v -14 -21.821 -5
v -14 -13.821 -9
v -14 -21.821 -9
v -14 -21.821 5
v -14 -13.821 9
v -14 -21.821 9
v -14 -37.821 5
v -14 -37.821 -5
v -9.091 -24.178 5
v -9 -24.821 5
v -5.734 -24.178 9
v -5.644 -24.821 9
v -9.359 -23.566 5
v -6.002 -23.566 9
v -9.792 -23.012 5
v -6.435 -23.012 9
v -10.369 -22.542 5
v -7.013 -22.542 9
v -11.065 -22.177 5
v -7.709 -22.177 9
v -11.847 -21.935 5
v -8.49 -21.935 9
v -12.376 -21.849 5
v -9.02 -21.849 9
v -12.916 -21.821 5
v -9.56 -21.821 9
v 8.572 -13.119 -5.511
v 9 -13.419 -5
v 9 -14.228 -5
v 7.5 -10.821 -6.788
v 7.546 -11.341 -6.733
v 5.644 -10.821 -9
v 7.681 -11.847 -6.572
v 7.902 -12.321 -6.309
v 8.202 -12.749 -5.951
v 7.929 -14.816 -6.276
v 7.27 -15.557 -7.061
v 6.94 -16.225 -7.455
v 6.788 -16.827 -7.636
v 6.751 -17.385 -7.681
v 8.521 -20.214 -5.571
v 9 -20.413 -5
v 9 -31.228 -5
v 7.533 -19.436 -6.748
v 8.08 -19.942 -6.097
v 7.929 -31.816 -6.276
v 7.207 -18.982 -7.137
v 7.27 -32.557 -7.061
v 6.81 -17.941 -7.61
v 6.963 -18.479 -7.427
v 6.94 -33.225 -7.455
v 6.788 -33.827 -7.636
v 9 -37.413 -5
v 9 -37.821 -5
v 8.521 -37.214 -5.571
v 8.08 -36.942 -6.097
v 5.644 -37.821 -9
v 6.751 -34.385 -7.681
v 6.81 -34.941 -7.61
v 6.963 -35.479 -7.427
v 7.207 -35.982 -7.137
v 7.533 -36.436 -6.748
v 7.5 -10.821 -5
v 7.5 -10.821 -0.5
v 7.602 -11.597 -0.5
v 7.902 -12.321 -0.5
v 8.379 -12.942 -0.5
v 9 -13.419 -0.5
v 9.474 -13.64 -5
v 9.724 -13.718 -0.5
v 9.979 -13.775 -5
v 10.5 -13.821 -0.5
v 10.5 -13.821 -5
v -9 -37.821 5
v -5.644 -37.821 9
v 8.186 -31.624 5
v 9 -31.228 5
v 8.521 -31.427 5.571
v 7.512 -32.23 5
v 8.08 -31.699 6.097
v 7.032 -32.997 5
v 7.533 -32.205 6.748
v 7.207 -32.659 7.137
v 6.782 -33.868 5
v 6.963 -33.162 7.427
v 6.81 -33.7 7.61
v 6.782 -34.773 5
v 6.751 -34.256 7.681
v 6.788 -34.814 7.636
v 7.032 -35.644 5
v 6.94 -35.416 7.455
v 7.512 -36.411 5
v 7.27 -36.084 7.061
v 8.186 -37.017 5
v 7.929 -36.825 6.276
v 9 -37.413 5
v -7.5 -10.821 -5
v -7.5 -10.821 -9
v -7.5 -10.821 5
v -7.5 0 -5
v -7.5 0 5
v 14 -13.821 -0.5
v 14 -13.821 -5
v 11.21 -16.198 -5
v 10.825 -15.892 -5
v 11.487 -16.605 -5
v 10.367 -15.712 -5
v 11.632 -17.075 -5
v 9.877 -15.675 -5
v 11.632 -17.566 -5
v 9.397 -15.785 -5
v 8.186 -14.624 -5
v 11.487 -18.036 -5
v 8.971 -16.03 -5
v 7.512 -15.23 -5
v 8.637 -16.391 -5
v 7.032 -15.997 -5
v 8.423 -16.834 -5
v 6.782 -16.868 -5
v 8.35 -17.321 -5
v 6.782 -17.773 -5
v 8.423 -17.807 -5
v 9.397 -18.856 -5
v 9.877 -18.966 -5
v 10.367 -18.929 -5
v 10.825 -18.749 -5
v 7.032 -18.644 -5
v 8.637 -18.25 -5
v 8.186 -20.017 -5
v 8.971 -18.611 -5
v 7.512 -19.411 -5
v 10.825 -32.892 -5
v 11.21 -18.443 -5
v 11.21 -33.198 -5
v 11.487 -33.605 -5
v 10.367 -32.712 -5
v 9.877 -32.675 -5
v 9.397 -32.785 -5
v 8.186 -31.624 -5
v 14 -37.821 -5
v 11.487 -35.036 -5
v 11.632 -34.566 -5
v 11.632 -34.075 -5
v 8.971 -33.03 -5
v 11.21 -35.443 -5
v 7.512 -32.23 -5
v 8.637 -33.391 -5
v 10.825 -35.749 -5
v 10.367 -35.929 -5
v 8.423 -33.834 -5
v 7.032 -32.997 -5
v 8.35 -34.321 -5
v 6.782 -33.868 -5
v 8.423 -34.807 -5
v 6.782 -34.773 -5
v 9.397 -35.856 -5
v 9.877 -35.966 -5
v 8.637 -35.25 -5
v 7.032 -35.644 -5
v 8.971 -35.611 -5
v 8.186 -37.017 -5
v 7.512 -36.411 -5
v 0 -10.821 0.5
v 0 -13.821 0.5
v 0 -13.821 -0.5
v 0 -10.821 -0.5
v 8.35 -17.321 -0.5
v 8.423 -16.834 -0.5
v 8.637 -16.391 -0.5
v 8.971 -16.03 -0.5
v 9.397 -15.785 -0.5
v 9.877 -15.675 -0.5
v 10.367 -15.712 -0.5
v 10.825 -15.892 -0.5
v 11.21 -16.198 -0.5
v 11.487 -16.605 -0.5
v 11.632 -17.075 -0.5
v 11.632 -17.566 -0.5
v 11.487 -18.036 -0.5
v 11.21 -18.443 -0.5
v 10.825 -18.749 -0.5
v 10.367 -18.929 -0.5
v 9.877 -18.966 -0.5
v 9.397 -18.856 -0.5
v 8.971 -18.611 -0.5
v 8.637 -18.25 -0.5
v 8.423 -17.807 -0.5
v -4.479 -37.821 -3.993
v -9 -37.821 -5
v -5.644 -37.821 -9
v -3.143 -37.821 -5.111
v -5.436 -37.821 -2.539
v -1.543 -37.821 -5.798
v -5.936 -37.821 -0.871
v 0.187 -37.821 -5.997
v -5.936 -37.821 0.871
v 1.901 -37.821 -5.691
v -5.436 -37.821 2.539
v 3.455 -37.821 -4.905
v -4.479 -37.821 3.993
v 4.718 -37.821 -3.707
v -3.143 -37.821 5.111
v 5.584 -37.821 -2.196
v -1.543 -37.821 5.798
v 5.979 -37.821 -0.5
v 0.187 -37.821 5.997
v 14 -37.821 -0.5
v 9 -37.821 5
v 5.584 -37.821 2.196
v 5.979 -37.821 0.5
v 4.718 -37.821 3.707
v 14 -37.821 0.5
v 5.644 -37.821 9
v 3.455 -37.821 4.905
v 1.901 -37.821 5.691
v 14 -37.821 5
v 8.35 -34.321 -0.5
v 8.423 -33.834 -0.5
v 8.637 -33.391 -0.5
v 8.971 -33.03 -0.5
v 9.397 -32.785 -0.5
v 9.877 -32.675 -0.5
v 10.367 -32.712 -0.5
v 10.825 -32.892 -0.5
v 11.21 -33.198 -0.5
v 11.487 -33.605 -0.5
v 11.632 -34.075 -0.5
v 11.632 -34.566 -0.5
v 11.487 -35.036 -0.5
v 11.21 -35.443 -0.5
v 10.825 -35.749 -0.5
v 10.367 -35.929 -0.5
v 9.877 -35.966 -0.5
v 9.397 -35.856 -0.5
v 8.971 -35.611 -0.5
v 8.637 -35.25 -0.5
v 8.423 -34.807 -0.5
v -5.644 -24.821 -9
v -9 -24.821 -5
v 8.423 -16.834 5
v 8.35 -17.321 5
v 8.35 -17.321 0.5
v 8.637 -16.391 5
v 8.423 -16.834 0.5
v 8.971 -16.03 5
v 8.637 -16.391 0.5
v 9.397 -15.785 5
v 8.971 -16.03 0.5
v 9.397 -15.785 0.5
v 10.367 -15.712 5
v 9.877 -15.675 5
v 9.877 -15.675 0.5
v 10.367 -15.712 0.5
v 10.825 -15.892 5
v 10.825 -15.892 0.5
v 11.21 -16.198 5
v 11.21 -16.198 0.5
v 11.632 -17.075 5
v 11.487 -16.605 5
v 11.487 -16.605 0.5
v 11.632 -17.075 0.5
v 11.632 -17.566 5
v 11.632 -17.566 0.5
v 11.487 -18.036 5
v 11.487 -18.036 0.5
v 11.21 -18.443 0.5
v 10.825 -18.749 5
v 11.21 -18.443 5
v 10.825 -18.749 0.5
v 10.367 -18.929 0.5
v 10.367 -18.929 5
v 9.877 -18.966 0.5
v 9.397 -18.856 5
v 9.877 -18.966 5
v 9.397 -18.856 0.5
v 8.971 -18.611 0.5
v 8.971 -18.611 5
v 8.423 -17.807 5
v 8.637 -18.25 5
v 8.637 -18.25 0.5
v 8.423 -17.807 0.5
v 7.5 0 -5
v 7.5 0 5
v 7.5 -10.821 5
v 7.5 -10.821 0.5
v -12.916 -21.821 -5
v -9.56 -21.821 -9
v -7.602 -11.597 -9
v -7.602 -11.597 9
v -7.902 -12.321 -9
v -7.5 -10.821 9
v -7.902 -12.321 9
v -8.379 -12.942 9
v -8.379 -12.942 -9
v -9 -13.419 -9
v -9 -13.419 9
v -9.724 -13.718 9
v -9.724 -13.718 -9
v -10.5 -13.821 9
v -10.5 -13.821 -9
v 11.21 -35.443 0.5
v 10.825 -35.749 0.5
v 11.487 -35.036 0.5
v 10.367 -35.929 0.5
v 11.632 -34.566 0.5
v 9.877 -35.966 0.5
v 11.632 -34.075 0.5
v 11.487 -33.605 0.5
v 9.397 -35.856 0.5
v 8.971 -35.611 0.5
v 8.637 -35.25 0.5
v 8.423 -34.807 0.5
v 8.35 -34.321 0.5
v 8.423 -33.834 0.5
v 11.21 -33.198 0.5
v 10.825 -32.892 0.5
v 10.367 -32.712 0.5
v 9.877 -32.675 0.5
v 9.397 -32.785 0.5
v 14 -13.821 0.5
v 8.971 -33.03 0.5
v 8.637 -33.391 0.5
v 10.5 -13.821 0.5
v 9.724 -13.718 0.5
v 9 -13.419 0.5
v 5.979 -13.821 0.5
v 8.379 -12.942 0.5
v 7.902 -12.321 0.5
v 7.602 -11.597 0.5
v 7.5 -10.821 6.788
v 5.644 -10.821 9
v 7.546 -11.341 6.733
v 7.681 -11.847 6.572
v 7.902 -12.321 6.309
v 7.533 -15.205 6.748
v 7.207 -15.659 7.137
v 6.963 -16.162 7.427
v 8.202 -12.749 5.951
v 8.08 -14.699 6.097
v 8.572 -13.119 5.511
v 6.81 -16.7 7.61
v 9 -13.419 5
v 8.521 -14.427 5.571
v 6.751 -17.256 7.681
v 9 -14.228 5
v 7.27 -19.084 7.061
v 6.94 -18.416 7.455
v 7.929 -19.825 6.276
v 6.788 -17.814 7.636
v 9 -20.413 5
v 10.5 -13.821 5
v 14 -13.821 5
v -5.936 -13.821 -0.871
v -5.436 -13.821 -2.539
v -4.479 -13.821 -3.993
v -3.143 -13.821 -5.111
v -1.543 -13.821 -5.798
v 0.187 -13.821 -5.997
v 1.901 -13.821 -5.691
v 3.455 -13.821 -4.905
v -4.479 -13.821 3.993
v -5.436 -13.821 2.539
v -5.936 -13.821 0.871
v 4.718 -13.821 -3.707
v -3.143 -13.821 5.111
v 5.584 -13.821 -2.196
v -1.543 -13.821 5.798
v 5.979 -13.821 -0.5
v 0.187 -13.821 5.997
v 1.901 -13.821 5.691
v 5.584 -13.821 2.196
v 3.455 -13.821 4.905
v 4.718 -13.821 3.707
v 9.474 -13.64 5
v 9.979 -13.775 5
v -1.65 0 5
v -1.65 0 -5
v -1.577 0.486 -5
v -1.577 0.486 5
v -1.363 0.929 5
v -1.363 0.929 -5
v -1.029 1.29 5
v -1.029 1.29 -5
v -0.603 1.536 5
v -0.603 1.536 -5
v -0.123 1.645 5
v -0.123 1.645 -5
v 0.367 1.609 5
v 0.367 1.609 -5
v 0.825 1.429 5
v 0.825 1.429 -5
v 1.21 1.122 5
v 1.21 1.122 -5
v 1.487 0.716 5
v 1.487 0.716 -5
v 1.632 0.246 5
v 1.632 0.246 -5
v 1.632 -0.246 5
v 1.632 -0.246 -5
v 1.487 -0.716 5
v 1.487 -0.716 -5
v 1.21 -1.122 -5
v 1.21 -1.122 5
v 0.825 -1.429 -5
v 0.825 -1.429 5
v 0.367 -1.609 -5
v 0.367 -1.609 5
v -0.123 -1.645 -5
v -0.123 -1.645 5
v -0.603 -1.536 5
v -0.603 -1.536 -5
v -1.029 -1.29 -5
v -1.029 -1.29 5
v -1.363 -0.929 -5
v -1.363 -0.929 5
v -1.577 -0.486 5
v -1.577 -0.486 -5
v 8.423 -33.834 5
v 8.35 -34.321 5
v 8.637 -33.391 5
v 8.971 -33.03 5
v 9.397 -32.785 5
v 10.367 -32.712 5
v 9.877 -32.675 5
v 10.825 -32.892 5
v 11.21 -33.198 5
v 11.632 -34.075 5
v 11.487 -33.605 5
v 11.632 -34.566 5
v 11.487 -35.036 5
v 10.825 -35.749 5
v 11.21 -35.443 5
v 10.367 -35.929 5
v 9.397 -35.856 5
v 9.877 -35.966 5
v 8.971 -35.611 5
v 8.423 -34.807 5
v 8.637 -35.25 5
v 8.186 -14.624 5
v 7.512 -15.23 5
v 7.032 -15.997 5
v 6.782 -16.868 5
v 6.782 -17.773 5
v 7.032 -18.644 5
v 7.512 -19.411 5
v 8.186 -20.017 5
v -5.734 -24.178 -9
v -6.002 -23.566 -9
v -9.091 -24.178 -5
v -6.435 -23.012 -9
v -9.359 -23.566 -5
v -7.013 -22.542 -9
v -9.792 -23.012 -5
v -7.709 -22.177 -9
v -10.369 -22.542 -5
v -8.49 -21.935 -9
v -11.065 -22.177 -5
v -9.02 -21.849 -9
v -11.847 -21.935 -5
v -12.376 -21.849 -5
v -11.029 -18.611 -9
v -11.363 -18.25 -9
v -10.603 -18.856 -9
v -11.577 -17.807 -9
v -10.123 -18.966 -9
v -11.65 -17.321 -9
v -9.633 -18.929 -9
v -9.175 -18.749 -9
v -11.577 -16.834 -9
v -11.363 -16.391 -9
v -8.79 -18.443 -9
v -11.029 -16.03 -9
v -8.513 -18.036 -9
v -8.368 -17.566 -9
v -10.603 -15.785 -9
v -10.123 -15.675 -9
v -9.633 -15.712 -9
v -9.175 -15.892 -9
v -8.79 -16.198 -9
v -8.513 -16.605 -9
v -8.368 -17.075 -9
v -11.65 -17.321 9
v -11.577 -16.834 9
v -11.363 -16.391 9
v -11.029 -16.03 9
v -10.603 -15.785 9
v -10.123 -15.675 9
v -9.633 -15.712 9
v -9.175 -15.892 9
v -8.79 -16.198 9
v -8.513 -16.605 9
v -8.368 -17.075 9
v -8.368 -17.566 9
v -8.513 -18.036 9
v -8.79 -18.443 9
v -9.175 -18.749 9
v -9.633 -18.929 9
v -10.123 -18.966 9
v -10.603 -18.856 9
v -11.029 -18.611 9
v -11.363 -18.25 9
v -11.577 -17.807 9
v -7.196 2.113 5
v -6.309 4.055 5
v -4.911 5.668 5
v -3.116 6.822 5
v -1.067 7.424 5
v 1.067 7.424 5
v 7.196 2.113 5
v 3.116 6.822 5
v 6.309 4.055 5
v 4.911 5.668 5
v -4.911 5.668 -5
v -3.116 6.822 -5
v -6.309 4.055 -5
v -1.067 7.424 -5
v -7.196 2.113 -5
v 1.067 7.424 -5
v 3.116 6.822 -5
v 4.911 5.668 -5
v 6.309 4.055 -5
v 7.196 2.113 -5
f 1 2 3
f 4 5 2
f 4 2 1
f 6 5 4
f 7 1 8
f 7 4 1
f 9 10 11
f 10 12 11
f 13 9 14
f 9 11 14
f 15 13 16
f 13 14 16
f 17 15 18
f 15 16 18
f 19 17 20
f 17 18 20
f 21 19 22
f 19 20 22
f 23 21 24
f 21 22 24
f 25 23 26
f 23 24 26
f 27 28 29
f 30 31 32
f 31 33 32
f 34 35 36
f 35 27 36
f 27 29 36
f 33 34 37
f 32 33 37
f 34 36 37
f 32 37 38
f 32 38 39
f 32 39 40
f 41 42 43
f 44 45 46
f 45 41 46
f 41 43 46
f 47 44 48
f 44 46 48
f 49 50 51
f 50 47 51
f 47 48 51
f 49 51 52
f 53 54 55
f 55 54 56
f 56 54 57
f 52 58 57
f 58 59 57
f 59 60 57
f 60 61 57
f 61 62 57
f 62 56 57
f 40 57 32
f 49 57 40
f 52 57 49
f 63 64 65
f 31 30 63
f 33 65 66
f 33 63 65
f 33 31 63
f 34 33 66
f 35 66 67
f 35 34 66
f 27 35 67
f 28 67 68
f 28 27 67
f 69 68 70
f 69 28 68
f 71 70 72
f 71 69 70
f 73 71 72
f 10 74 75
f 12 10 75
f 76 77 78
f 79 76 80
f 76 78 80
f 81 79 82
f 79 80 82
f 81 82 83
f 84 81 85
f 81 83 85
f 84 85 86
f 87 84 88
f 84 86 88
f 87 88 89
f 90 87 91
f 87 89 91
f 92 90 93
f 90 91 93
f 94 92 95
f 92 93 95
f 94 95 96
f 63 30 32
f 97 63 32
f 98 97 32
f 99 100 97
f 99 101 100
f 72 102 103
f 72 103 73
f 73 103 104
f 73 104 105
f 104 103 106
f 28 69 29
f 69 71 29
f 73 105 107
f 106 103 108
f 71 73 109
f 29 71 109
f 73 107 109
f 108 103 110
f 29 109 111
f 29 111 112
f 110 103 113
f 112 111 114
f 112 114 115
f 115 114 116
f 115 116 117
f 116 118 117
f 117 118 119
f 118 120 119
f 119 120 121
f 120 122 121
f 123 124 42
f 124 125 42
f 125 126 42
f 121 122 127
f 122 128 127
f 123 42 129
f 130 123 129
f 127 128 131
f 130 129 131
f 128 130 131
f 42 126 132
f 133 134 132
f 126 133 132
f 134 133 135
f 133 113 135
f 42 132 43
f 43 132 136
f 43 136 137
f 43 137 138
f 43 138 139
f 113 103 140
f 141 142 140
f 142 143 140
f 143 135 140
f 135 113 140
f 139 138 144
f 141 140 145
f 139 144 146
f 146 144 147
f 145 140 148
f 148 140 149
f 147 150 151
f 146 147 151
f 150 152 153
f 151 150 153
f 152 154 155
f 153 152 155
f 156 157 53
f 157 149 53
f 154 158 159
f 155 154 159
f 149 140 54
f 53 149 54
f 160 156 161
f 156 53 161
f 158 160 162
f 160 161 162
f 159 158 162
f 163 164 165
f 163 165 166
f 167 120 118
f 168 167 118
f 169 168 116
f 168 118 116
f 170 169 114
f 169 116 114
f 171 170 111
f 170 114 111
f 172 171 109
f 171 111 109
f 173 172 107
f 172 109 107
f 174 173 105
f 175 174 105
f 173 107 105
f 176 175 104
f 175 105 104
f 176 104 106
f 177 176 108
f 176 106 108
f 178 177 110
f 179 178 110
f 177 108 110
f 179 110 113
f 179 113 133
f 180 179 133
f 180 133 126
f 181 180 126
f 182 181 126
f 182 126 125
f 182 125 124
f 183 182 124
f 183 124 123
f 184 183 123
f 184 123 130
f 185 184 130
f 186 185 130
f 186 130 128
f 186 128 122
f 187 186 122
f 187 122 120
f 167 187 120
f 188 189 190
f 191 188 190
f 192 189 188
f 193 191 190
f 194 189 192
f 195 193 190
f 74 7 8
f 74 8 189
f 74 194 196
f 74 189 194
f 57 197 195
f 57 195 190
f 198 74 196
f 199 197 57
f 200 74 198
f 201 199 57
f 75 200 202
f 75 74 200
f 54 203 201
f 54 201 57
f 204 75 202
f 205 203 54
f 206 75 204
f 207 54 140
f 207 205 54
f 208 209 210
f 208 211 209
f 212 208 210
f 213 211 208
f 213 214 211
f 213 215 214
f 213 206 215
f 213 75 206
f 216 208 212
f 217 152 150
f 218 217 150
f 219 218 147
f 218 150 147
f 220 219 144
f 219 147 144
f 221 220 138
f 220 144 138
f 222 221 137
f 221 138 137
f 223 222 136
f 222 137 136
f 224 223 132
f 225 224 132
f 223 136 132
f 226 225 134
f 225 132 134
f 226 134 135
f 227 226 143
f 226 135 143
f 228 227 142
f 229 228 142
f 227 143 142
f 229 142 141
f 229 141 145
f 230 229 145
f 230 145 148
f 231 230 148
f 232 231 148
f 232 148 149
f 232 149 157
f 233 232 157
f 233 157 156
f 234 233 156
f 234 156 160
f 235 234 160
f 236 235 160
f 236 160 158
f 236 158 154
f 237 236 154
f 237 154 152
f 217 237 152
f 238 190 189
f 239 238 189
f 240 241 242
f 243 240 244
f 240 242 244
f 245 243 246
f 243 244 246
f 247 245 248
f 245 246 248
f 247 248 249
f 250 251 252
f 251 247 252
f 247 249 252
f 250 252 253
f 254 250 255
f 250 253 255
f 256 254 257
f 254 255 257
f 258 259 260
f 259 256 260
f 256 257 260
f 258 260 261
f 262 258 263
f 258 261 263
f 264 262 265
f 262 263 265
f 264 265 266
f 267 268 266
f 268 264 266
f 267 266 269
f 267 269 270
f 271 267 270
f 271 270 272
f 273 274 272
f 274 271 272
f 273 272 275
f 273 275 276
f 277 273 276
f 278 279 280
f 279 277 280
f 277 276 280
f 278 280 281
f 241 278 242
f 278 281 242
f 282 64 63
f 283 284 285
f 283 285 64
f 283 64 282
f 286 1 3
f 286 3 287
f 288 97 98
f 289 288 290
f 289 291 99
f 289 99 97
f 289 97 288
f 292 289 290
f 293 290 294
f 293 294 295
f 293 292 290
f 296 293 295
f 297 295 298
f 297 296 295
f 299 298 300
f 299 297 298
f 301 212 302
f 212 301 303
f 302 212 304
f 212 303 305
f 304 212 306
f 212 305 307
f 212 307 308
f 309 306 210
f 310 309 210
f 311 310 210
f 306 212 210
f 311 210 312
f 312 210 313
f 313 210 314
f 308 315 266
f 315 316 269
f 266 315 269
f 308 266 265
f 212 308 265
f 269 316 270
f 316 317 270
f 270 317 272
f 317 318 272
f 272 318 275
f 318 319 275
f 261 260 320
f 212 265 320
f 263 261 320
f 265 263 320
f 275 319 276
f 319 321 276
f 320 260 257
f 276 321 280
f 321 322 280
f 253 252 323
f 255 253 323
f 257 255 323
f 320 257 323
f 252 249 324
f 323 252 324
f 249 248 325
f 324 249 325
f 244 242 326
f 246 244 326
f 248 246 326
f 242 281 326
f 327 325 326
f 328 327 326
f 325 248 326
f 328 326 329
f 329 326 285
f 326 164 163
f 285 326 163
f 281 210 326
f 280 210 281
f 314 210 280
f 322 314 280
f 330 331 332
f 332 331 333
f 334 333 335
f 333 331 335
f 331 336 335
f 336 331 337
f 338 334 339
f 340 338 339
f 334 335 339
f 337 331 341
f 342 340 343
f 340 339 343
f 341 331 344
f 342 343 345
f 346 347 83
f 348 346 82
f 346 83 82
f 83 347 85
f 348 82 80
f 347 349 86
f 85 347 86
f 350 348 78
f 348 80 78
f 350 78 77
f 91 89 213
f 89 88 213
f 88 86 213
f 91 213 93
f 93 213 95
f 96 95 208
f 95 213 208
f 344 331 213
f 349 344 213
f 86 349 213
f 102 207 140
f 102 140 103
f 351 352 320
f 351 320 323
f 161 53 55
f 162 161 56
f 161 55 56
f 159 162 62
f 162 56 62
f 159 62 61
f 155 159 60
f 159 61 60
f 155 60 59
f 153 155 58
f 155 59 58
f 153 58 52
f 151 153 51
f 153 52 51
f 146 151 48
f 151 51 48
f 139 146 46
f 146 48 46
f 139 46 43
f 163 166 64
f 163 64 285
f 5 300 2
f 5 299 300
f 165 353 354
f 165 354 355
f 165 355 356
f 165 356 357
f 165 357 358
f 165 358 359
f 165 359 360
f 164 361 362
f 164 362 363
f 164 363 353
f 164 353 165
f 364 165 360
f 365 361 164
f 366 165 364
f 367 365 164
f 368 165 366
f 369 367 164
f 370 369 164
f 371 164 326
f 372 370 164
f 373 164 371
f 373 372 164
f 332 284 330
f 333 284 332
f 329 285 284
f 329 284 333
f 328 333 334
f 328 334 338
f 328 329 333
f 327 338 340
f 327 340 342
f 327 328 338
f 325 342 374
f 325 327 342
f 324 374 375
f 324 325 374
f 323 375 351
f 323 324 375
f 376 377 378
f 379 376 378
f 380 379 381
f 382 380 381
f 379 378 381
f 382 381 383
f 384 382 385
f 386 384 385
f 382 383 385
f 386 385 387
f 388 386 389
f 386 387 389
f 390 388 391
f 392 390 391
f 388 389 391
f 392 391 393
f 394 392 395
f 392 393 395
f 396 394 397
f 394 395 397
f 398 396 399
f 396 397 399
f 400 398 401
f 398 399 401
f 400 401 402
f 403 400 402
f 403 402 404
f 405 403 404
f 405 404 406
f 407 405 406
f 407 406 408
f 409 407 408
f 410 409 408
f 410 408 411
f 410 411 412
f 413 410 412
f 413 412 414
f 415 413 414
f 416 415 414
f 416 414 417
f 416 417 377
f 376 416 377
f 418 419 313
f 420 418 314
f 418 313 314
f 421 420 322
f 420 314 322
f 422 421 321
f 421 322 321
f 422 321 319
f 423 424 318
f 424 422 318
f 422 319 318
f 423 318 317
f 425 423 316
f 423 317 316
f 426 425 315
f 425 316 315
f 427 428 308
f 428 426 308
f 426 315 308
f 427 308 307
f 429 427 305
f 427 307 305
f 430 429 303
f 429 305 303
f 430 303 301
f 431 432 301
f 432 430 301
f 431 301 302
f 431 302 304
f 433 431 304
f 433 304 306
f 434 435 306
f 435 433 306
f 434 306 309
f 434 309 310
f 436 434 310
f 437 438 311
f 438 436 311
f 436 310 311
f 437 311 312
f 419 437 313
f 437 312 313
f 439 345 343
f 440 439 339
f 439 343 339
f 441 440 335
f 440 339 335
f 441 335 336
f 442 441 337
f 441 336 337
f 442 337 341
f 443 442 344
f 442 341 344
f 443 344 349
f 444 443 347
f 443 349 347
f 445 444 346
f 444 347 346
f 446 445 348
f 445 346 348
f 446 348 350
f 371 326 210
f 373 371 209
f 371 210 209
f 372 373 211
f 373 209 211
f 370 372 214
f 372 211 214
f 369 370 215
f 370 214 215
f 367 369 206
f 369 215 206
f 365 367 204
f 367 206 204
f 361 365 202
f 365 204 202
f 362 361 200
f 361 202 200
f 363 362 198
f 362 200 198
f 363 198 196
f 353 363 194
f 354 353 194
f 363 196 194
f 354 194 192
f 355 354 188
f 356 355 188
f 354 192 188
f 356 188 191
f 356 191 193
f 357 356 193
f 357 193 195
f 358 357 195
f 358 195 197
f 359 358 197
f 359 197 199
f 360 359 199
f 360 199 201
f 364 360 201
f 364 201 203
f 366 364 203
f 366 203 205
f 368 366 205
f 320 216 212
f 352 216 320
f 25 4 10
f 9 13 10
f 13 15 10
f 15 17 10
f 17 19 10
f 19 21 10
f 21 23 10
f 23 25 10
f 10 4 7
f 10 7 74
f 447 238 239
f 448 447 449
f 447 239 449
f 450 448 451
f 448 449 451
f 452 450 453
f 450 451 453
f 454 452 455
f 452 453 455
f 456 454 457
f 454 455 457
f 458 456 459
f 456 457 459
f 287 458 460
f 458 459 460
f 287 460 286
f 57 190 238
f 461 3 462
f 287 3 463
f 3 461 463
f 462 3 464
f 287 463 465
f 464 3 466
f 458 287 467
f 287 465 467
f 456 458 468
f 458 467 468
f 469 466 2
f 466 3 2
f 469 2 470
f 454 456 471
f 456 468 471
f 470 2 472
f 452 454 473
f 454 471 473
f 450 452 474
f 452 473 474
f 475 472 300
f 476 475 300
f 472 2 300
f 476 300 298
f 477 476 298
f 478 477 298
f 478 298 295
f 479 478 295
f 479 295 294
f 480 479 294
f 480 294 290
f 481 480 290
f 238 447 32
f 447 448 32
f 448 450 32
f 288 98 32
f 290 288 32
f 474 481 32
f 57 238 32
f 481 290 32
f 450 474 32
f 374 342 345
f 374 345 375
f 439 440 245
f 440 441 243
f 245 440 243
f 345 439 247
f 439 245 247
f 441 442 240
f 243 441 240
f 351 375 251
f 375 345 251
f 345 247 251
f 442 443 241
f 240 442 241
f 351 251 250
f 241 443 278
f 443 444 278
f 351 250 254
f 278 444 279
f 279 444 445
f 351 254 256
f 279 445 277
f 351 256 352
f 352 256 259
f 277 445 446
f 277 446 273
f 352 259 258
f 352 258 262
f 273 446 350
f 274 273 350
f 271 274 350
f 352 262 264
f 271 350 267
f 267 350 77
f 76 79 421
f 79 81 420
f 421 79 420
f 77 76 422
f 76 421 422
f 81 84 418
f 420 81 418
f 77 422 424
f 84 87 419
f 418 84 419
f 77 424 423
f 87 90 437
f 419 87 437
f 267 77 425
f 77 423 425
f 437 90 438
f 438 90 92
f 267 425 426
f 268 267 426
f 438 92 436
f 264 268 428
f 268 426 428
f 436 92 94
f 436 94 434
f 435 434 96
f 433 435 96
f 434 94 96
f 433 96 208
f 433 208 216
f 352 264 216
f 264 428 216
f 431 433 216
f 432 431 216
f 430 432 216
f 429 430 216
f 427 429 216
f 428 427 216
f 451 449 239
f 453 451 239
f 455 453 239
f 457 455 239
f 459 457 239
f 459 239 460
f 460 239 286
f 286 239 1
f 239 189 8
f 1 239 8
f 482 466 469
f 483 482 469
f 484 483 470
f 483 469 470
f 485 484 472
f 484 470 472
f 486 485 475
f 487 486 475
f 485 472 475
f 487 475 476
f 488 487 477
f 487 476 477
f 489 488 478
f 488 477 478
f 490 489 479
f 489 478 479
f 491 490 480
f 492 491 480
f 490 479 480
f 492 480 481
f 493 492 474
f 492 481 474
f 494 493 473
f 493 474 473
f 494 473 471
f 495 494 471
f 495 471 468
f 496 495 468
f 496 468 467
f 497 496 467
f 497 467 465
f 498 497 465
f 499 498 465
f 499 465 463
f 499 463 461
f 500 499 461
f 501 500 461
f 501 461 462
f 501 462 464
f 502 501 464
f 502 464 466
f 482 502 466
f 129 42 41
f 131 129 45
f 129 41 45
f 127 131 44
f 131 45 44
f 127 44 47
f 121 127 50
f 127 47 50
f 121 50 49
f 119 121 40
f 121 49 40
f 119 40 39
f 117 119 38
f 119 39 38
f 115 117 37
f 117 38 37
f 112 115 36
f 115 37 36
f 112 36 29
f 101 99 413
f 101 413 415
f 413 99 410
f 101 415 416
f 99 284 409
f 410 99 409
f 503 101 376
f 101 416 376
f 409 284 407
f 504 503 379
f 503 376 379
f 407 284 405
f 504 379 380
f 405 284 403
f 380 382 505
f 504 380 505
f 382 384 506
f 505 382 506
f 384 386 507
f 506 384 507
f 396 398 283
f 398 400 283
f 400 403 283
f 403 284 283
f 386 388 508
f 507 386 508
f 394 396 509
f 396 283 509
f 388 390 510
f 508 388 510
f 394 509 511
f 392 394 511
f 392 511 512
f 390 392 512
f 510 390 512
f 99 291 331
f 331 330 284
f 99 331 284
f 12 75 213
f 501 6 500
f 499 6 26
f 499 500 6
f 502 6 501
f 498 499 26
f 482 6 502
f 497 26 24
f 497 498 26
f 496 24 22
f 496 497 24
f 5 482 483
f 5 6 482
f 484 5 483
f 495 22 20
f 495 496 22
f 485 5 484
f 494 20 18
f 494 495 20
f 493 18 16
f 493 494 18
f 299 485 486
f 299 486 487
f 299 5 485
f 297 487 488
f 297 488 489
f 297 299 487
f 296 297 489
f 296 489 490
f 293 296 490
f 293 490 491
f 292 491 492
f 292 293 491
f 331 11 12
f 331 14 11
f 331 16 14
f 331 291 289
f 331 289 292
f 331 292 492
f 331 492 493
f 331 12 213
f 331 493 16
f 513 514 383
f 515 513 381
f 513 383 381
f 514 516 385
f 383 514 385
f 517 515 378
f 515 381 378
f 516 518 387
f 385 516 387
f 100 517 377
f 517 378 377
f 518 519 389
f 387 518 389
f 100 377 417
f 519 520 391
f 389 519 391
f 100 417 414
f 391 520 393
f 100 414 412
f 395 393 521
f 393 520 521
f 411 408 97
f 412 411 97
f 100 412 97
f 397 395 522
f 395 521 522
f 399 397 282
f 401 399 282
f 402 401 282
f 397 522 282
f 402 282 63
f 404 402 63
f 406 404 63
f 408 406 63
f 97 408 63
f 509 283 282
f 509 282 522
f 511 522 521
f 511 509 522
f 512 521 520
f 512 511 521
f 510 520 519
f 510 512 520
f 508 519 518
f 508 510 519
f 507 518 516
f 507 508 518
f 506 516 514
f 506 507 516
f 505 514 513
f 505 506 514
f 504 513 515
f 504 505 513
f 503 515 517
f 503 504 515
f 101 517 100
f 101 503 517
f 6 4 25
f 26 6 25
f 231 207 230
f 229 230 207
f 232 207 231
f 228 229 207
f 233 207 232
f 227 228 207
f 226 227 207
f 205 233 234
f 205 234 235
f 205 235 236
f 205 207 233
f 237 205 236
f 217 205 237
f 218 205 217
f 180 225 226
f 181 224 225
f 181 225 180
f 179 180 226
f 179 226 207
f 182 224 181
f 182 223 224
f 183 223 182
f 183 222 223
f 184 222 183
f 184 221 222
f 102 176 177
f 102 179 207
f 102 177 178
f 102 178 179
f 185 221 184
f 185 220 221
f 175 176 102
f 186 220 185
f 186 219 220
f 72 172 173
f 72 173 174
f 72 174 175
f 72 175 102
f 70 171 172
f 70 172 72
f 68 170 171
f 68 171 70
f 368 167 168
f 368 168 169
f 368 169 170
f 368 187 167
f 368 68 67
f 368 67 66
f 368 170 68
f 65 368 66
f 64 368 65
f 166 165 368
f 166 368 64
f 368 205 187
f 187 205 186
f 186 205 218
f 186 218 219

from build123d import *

# Parameters (mm, degrees)
F2_DEPTH        = 9
F3_R            = 6
F4_DEPTH        = 24
F6_DEPTH        = 45.3215080757
F7_DEPTH        = 16
F8_R            = 3
F10_DEPTH       = 21.501
F12_D           = 3.3
F12_START       = 4
F12_CBORE_D     = 6.5
F12_CBORE_DEPTH = 0
F14_D           = 3.3
F14_START       = 4
F14_CBORE_D     = 6.5
F14_CBORE_DEPTH = 0
F15_W           = 27
F15_H           = 1
F16_DEPTH       = 30


with BuildPart() as f2:
    # F1 (on Top) → F2 (new body, symmetric)
    with BuildSketch(Plane.XY):
        with BuildLine():
            ThreePointArc((-7.5, 0), (0, -7.5), (7.5, 0))
            ThreePointArc((7.5, 0), (0, 7.5), (-7.5, 0))
        make_face()
        with BuildLine():
            Line((7.5, -13.8205080757), (7.5, 0))
            ThreePointArc((7.5, 0), (0, -7.5), (-7.5, 0))
            Line((-7.5, 0), (-7.5, -13.8205080757))
            Line((-7.5, -13.8205080757), (-14, -13.8205080757))
            Line((-14, -13.8205080757), (-14, -37.8205080757))
            Line((-14, -37.8205080757), (14, -37.8205080757))
            Line((14, -37.8205080757), (14, -13.8205080757))
            Line((14, -13.8205080757), (7.5, -13.8205080757))
        make_face()
    extrude(amount=F2_DEPTH, both=True)

    # F3 (on face) → F4 (cut)
    with BuildSketch(Plane.XZ.offset(37.8205080757)):
        Circle(F3_R)
    extrude(amount=-F4_DEPTH, mode=Mode.SUBTRACT)

    # F5 (on face) → F6 (cut, through all)
    with BuildSketch(Plane.XZ.offset(37.8205080757)):
        Polygon((14, 9), (5.6436014753, 9), (9, 5), (14, 5), align=None)
        Polygon((14, -9), (14, -5), (9, -5), (5.6436014753, -9), align=None)
    extrude(amount=-F6_DEPTH, mode=Mode.SUBTRACT)

    # F5 (on face) → F7 (cut)
    with BuildSketch(Plane.XZ.offset(37.8205080757)):
        Polygon((-9, 5), (-5.6436014753, 9), (-14, 9), (-14, 5), align=None)
        Polygon((-9, -5), (-14, -5), (-14, -9), (-5.6436014753, -9), align=None)
    extrude(amount=-F7_DEPTH, mode=Mode.SUBTRACT)

    # F8
    f8_edges = [f2.edges().sort_by_distance(p)[0] for p in [
        (7.5, -13.820508, 0),
        (-7.5, -13.820508, 0),
        (-7.321801, -21.820508, 7),
        (-7.321801, -21.820508, -7),
    ]]
    fillet(f8_edges, radius=F8_R)

    # F9 (on face) → F10 (cut, through all)
    with BuildSketch(Plane.YZ.offset(7.5)):
        Polygon((9.9274870008, 9), (4.9396115625, 9), (-10.8205080757, 9), (-10.8205080757, 6.7876303889), (-10.8205080757, 5), (9.9274870008, 5), align=None)
        Polygon((9.9274870008, -5), (-10.8205080757, -5), (-10.8205080757, -6.7876303889), (-10.8205080757, -9), (9.9274870008, -9), align=None)
    extrude(amount=-F10_DEPTH, mode=Mode.SUBTRACT)

    # F12 (through all)
    # its depths count from where the whole tool has entered the part; down to there all is cleared
    with Locations(Plane.XY.offset(9)):
        with Locations((10, -34.3205080757, -F12_START), (10, -17.3205080757, -F12_START), (0, 0, -F12_START), (-10, -17.3205080757, 0)):
            CounterBoreHole(F12_D / 2, F12_CBORE_D / 2, F12_CBORE_DEPTH)

    # F14 (through all)
    # its depths count from where the whole tool has entered the part; down to there all is cleared
    with Locations(Plane(origin=(0, 0, -9), x_dir=(1, 0, 0), z_dir=(0, 0, -1)).offset(-F14_START)):
        with Locations((10, 34.3205080757), (10, 17.3205080757)):
            CounterBoreHole(F14_D / 2, F14_CBORE_D / 2, F14_CBORE_DEPTH)

    # F15 (on Right) → F16 (cut)
    with BuildSketch(Plane.YZ):
        with Locations((-24.3205080757, 0)):
            Rectangle(F15_W, F15_H)
    extrude(amount=F16_DEPTH, mode=Mode.SUBTRACT)


solid = f2.part
